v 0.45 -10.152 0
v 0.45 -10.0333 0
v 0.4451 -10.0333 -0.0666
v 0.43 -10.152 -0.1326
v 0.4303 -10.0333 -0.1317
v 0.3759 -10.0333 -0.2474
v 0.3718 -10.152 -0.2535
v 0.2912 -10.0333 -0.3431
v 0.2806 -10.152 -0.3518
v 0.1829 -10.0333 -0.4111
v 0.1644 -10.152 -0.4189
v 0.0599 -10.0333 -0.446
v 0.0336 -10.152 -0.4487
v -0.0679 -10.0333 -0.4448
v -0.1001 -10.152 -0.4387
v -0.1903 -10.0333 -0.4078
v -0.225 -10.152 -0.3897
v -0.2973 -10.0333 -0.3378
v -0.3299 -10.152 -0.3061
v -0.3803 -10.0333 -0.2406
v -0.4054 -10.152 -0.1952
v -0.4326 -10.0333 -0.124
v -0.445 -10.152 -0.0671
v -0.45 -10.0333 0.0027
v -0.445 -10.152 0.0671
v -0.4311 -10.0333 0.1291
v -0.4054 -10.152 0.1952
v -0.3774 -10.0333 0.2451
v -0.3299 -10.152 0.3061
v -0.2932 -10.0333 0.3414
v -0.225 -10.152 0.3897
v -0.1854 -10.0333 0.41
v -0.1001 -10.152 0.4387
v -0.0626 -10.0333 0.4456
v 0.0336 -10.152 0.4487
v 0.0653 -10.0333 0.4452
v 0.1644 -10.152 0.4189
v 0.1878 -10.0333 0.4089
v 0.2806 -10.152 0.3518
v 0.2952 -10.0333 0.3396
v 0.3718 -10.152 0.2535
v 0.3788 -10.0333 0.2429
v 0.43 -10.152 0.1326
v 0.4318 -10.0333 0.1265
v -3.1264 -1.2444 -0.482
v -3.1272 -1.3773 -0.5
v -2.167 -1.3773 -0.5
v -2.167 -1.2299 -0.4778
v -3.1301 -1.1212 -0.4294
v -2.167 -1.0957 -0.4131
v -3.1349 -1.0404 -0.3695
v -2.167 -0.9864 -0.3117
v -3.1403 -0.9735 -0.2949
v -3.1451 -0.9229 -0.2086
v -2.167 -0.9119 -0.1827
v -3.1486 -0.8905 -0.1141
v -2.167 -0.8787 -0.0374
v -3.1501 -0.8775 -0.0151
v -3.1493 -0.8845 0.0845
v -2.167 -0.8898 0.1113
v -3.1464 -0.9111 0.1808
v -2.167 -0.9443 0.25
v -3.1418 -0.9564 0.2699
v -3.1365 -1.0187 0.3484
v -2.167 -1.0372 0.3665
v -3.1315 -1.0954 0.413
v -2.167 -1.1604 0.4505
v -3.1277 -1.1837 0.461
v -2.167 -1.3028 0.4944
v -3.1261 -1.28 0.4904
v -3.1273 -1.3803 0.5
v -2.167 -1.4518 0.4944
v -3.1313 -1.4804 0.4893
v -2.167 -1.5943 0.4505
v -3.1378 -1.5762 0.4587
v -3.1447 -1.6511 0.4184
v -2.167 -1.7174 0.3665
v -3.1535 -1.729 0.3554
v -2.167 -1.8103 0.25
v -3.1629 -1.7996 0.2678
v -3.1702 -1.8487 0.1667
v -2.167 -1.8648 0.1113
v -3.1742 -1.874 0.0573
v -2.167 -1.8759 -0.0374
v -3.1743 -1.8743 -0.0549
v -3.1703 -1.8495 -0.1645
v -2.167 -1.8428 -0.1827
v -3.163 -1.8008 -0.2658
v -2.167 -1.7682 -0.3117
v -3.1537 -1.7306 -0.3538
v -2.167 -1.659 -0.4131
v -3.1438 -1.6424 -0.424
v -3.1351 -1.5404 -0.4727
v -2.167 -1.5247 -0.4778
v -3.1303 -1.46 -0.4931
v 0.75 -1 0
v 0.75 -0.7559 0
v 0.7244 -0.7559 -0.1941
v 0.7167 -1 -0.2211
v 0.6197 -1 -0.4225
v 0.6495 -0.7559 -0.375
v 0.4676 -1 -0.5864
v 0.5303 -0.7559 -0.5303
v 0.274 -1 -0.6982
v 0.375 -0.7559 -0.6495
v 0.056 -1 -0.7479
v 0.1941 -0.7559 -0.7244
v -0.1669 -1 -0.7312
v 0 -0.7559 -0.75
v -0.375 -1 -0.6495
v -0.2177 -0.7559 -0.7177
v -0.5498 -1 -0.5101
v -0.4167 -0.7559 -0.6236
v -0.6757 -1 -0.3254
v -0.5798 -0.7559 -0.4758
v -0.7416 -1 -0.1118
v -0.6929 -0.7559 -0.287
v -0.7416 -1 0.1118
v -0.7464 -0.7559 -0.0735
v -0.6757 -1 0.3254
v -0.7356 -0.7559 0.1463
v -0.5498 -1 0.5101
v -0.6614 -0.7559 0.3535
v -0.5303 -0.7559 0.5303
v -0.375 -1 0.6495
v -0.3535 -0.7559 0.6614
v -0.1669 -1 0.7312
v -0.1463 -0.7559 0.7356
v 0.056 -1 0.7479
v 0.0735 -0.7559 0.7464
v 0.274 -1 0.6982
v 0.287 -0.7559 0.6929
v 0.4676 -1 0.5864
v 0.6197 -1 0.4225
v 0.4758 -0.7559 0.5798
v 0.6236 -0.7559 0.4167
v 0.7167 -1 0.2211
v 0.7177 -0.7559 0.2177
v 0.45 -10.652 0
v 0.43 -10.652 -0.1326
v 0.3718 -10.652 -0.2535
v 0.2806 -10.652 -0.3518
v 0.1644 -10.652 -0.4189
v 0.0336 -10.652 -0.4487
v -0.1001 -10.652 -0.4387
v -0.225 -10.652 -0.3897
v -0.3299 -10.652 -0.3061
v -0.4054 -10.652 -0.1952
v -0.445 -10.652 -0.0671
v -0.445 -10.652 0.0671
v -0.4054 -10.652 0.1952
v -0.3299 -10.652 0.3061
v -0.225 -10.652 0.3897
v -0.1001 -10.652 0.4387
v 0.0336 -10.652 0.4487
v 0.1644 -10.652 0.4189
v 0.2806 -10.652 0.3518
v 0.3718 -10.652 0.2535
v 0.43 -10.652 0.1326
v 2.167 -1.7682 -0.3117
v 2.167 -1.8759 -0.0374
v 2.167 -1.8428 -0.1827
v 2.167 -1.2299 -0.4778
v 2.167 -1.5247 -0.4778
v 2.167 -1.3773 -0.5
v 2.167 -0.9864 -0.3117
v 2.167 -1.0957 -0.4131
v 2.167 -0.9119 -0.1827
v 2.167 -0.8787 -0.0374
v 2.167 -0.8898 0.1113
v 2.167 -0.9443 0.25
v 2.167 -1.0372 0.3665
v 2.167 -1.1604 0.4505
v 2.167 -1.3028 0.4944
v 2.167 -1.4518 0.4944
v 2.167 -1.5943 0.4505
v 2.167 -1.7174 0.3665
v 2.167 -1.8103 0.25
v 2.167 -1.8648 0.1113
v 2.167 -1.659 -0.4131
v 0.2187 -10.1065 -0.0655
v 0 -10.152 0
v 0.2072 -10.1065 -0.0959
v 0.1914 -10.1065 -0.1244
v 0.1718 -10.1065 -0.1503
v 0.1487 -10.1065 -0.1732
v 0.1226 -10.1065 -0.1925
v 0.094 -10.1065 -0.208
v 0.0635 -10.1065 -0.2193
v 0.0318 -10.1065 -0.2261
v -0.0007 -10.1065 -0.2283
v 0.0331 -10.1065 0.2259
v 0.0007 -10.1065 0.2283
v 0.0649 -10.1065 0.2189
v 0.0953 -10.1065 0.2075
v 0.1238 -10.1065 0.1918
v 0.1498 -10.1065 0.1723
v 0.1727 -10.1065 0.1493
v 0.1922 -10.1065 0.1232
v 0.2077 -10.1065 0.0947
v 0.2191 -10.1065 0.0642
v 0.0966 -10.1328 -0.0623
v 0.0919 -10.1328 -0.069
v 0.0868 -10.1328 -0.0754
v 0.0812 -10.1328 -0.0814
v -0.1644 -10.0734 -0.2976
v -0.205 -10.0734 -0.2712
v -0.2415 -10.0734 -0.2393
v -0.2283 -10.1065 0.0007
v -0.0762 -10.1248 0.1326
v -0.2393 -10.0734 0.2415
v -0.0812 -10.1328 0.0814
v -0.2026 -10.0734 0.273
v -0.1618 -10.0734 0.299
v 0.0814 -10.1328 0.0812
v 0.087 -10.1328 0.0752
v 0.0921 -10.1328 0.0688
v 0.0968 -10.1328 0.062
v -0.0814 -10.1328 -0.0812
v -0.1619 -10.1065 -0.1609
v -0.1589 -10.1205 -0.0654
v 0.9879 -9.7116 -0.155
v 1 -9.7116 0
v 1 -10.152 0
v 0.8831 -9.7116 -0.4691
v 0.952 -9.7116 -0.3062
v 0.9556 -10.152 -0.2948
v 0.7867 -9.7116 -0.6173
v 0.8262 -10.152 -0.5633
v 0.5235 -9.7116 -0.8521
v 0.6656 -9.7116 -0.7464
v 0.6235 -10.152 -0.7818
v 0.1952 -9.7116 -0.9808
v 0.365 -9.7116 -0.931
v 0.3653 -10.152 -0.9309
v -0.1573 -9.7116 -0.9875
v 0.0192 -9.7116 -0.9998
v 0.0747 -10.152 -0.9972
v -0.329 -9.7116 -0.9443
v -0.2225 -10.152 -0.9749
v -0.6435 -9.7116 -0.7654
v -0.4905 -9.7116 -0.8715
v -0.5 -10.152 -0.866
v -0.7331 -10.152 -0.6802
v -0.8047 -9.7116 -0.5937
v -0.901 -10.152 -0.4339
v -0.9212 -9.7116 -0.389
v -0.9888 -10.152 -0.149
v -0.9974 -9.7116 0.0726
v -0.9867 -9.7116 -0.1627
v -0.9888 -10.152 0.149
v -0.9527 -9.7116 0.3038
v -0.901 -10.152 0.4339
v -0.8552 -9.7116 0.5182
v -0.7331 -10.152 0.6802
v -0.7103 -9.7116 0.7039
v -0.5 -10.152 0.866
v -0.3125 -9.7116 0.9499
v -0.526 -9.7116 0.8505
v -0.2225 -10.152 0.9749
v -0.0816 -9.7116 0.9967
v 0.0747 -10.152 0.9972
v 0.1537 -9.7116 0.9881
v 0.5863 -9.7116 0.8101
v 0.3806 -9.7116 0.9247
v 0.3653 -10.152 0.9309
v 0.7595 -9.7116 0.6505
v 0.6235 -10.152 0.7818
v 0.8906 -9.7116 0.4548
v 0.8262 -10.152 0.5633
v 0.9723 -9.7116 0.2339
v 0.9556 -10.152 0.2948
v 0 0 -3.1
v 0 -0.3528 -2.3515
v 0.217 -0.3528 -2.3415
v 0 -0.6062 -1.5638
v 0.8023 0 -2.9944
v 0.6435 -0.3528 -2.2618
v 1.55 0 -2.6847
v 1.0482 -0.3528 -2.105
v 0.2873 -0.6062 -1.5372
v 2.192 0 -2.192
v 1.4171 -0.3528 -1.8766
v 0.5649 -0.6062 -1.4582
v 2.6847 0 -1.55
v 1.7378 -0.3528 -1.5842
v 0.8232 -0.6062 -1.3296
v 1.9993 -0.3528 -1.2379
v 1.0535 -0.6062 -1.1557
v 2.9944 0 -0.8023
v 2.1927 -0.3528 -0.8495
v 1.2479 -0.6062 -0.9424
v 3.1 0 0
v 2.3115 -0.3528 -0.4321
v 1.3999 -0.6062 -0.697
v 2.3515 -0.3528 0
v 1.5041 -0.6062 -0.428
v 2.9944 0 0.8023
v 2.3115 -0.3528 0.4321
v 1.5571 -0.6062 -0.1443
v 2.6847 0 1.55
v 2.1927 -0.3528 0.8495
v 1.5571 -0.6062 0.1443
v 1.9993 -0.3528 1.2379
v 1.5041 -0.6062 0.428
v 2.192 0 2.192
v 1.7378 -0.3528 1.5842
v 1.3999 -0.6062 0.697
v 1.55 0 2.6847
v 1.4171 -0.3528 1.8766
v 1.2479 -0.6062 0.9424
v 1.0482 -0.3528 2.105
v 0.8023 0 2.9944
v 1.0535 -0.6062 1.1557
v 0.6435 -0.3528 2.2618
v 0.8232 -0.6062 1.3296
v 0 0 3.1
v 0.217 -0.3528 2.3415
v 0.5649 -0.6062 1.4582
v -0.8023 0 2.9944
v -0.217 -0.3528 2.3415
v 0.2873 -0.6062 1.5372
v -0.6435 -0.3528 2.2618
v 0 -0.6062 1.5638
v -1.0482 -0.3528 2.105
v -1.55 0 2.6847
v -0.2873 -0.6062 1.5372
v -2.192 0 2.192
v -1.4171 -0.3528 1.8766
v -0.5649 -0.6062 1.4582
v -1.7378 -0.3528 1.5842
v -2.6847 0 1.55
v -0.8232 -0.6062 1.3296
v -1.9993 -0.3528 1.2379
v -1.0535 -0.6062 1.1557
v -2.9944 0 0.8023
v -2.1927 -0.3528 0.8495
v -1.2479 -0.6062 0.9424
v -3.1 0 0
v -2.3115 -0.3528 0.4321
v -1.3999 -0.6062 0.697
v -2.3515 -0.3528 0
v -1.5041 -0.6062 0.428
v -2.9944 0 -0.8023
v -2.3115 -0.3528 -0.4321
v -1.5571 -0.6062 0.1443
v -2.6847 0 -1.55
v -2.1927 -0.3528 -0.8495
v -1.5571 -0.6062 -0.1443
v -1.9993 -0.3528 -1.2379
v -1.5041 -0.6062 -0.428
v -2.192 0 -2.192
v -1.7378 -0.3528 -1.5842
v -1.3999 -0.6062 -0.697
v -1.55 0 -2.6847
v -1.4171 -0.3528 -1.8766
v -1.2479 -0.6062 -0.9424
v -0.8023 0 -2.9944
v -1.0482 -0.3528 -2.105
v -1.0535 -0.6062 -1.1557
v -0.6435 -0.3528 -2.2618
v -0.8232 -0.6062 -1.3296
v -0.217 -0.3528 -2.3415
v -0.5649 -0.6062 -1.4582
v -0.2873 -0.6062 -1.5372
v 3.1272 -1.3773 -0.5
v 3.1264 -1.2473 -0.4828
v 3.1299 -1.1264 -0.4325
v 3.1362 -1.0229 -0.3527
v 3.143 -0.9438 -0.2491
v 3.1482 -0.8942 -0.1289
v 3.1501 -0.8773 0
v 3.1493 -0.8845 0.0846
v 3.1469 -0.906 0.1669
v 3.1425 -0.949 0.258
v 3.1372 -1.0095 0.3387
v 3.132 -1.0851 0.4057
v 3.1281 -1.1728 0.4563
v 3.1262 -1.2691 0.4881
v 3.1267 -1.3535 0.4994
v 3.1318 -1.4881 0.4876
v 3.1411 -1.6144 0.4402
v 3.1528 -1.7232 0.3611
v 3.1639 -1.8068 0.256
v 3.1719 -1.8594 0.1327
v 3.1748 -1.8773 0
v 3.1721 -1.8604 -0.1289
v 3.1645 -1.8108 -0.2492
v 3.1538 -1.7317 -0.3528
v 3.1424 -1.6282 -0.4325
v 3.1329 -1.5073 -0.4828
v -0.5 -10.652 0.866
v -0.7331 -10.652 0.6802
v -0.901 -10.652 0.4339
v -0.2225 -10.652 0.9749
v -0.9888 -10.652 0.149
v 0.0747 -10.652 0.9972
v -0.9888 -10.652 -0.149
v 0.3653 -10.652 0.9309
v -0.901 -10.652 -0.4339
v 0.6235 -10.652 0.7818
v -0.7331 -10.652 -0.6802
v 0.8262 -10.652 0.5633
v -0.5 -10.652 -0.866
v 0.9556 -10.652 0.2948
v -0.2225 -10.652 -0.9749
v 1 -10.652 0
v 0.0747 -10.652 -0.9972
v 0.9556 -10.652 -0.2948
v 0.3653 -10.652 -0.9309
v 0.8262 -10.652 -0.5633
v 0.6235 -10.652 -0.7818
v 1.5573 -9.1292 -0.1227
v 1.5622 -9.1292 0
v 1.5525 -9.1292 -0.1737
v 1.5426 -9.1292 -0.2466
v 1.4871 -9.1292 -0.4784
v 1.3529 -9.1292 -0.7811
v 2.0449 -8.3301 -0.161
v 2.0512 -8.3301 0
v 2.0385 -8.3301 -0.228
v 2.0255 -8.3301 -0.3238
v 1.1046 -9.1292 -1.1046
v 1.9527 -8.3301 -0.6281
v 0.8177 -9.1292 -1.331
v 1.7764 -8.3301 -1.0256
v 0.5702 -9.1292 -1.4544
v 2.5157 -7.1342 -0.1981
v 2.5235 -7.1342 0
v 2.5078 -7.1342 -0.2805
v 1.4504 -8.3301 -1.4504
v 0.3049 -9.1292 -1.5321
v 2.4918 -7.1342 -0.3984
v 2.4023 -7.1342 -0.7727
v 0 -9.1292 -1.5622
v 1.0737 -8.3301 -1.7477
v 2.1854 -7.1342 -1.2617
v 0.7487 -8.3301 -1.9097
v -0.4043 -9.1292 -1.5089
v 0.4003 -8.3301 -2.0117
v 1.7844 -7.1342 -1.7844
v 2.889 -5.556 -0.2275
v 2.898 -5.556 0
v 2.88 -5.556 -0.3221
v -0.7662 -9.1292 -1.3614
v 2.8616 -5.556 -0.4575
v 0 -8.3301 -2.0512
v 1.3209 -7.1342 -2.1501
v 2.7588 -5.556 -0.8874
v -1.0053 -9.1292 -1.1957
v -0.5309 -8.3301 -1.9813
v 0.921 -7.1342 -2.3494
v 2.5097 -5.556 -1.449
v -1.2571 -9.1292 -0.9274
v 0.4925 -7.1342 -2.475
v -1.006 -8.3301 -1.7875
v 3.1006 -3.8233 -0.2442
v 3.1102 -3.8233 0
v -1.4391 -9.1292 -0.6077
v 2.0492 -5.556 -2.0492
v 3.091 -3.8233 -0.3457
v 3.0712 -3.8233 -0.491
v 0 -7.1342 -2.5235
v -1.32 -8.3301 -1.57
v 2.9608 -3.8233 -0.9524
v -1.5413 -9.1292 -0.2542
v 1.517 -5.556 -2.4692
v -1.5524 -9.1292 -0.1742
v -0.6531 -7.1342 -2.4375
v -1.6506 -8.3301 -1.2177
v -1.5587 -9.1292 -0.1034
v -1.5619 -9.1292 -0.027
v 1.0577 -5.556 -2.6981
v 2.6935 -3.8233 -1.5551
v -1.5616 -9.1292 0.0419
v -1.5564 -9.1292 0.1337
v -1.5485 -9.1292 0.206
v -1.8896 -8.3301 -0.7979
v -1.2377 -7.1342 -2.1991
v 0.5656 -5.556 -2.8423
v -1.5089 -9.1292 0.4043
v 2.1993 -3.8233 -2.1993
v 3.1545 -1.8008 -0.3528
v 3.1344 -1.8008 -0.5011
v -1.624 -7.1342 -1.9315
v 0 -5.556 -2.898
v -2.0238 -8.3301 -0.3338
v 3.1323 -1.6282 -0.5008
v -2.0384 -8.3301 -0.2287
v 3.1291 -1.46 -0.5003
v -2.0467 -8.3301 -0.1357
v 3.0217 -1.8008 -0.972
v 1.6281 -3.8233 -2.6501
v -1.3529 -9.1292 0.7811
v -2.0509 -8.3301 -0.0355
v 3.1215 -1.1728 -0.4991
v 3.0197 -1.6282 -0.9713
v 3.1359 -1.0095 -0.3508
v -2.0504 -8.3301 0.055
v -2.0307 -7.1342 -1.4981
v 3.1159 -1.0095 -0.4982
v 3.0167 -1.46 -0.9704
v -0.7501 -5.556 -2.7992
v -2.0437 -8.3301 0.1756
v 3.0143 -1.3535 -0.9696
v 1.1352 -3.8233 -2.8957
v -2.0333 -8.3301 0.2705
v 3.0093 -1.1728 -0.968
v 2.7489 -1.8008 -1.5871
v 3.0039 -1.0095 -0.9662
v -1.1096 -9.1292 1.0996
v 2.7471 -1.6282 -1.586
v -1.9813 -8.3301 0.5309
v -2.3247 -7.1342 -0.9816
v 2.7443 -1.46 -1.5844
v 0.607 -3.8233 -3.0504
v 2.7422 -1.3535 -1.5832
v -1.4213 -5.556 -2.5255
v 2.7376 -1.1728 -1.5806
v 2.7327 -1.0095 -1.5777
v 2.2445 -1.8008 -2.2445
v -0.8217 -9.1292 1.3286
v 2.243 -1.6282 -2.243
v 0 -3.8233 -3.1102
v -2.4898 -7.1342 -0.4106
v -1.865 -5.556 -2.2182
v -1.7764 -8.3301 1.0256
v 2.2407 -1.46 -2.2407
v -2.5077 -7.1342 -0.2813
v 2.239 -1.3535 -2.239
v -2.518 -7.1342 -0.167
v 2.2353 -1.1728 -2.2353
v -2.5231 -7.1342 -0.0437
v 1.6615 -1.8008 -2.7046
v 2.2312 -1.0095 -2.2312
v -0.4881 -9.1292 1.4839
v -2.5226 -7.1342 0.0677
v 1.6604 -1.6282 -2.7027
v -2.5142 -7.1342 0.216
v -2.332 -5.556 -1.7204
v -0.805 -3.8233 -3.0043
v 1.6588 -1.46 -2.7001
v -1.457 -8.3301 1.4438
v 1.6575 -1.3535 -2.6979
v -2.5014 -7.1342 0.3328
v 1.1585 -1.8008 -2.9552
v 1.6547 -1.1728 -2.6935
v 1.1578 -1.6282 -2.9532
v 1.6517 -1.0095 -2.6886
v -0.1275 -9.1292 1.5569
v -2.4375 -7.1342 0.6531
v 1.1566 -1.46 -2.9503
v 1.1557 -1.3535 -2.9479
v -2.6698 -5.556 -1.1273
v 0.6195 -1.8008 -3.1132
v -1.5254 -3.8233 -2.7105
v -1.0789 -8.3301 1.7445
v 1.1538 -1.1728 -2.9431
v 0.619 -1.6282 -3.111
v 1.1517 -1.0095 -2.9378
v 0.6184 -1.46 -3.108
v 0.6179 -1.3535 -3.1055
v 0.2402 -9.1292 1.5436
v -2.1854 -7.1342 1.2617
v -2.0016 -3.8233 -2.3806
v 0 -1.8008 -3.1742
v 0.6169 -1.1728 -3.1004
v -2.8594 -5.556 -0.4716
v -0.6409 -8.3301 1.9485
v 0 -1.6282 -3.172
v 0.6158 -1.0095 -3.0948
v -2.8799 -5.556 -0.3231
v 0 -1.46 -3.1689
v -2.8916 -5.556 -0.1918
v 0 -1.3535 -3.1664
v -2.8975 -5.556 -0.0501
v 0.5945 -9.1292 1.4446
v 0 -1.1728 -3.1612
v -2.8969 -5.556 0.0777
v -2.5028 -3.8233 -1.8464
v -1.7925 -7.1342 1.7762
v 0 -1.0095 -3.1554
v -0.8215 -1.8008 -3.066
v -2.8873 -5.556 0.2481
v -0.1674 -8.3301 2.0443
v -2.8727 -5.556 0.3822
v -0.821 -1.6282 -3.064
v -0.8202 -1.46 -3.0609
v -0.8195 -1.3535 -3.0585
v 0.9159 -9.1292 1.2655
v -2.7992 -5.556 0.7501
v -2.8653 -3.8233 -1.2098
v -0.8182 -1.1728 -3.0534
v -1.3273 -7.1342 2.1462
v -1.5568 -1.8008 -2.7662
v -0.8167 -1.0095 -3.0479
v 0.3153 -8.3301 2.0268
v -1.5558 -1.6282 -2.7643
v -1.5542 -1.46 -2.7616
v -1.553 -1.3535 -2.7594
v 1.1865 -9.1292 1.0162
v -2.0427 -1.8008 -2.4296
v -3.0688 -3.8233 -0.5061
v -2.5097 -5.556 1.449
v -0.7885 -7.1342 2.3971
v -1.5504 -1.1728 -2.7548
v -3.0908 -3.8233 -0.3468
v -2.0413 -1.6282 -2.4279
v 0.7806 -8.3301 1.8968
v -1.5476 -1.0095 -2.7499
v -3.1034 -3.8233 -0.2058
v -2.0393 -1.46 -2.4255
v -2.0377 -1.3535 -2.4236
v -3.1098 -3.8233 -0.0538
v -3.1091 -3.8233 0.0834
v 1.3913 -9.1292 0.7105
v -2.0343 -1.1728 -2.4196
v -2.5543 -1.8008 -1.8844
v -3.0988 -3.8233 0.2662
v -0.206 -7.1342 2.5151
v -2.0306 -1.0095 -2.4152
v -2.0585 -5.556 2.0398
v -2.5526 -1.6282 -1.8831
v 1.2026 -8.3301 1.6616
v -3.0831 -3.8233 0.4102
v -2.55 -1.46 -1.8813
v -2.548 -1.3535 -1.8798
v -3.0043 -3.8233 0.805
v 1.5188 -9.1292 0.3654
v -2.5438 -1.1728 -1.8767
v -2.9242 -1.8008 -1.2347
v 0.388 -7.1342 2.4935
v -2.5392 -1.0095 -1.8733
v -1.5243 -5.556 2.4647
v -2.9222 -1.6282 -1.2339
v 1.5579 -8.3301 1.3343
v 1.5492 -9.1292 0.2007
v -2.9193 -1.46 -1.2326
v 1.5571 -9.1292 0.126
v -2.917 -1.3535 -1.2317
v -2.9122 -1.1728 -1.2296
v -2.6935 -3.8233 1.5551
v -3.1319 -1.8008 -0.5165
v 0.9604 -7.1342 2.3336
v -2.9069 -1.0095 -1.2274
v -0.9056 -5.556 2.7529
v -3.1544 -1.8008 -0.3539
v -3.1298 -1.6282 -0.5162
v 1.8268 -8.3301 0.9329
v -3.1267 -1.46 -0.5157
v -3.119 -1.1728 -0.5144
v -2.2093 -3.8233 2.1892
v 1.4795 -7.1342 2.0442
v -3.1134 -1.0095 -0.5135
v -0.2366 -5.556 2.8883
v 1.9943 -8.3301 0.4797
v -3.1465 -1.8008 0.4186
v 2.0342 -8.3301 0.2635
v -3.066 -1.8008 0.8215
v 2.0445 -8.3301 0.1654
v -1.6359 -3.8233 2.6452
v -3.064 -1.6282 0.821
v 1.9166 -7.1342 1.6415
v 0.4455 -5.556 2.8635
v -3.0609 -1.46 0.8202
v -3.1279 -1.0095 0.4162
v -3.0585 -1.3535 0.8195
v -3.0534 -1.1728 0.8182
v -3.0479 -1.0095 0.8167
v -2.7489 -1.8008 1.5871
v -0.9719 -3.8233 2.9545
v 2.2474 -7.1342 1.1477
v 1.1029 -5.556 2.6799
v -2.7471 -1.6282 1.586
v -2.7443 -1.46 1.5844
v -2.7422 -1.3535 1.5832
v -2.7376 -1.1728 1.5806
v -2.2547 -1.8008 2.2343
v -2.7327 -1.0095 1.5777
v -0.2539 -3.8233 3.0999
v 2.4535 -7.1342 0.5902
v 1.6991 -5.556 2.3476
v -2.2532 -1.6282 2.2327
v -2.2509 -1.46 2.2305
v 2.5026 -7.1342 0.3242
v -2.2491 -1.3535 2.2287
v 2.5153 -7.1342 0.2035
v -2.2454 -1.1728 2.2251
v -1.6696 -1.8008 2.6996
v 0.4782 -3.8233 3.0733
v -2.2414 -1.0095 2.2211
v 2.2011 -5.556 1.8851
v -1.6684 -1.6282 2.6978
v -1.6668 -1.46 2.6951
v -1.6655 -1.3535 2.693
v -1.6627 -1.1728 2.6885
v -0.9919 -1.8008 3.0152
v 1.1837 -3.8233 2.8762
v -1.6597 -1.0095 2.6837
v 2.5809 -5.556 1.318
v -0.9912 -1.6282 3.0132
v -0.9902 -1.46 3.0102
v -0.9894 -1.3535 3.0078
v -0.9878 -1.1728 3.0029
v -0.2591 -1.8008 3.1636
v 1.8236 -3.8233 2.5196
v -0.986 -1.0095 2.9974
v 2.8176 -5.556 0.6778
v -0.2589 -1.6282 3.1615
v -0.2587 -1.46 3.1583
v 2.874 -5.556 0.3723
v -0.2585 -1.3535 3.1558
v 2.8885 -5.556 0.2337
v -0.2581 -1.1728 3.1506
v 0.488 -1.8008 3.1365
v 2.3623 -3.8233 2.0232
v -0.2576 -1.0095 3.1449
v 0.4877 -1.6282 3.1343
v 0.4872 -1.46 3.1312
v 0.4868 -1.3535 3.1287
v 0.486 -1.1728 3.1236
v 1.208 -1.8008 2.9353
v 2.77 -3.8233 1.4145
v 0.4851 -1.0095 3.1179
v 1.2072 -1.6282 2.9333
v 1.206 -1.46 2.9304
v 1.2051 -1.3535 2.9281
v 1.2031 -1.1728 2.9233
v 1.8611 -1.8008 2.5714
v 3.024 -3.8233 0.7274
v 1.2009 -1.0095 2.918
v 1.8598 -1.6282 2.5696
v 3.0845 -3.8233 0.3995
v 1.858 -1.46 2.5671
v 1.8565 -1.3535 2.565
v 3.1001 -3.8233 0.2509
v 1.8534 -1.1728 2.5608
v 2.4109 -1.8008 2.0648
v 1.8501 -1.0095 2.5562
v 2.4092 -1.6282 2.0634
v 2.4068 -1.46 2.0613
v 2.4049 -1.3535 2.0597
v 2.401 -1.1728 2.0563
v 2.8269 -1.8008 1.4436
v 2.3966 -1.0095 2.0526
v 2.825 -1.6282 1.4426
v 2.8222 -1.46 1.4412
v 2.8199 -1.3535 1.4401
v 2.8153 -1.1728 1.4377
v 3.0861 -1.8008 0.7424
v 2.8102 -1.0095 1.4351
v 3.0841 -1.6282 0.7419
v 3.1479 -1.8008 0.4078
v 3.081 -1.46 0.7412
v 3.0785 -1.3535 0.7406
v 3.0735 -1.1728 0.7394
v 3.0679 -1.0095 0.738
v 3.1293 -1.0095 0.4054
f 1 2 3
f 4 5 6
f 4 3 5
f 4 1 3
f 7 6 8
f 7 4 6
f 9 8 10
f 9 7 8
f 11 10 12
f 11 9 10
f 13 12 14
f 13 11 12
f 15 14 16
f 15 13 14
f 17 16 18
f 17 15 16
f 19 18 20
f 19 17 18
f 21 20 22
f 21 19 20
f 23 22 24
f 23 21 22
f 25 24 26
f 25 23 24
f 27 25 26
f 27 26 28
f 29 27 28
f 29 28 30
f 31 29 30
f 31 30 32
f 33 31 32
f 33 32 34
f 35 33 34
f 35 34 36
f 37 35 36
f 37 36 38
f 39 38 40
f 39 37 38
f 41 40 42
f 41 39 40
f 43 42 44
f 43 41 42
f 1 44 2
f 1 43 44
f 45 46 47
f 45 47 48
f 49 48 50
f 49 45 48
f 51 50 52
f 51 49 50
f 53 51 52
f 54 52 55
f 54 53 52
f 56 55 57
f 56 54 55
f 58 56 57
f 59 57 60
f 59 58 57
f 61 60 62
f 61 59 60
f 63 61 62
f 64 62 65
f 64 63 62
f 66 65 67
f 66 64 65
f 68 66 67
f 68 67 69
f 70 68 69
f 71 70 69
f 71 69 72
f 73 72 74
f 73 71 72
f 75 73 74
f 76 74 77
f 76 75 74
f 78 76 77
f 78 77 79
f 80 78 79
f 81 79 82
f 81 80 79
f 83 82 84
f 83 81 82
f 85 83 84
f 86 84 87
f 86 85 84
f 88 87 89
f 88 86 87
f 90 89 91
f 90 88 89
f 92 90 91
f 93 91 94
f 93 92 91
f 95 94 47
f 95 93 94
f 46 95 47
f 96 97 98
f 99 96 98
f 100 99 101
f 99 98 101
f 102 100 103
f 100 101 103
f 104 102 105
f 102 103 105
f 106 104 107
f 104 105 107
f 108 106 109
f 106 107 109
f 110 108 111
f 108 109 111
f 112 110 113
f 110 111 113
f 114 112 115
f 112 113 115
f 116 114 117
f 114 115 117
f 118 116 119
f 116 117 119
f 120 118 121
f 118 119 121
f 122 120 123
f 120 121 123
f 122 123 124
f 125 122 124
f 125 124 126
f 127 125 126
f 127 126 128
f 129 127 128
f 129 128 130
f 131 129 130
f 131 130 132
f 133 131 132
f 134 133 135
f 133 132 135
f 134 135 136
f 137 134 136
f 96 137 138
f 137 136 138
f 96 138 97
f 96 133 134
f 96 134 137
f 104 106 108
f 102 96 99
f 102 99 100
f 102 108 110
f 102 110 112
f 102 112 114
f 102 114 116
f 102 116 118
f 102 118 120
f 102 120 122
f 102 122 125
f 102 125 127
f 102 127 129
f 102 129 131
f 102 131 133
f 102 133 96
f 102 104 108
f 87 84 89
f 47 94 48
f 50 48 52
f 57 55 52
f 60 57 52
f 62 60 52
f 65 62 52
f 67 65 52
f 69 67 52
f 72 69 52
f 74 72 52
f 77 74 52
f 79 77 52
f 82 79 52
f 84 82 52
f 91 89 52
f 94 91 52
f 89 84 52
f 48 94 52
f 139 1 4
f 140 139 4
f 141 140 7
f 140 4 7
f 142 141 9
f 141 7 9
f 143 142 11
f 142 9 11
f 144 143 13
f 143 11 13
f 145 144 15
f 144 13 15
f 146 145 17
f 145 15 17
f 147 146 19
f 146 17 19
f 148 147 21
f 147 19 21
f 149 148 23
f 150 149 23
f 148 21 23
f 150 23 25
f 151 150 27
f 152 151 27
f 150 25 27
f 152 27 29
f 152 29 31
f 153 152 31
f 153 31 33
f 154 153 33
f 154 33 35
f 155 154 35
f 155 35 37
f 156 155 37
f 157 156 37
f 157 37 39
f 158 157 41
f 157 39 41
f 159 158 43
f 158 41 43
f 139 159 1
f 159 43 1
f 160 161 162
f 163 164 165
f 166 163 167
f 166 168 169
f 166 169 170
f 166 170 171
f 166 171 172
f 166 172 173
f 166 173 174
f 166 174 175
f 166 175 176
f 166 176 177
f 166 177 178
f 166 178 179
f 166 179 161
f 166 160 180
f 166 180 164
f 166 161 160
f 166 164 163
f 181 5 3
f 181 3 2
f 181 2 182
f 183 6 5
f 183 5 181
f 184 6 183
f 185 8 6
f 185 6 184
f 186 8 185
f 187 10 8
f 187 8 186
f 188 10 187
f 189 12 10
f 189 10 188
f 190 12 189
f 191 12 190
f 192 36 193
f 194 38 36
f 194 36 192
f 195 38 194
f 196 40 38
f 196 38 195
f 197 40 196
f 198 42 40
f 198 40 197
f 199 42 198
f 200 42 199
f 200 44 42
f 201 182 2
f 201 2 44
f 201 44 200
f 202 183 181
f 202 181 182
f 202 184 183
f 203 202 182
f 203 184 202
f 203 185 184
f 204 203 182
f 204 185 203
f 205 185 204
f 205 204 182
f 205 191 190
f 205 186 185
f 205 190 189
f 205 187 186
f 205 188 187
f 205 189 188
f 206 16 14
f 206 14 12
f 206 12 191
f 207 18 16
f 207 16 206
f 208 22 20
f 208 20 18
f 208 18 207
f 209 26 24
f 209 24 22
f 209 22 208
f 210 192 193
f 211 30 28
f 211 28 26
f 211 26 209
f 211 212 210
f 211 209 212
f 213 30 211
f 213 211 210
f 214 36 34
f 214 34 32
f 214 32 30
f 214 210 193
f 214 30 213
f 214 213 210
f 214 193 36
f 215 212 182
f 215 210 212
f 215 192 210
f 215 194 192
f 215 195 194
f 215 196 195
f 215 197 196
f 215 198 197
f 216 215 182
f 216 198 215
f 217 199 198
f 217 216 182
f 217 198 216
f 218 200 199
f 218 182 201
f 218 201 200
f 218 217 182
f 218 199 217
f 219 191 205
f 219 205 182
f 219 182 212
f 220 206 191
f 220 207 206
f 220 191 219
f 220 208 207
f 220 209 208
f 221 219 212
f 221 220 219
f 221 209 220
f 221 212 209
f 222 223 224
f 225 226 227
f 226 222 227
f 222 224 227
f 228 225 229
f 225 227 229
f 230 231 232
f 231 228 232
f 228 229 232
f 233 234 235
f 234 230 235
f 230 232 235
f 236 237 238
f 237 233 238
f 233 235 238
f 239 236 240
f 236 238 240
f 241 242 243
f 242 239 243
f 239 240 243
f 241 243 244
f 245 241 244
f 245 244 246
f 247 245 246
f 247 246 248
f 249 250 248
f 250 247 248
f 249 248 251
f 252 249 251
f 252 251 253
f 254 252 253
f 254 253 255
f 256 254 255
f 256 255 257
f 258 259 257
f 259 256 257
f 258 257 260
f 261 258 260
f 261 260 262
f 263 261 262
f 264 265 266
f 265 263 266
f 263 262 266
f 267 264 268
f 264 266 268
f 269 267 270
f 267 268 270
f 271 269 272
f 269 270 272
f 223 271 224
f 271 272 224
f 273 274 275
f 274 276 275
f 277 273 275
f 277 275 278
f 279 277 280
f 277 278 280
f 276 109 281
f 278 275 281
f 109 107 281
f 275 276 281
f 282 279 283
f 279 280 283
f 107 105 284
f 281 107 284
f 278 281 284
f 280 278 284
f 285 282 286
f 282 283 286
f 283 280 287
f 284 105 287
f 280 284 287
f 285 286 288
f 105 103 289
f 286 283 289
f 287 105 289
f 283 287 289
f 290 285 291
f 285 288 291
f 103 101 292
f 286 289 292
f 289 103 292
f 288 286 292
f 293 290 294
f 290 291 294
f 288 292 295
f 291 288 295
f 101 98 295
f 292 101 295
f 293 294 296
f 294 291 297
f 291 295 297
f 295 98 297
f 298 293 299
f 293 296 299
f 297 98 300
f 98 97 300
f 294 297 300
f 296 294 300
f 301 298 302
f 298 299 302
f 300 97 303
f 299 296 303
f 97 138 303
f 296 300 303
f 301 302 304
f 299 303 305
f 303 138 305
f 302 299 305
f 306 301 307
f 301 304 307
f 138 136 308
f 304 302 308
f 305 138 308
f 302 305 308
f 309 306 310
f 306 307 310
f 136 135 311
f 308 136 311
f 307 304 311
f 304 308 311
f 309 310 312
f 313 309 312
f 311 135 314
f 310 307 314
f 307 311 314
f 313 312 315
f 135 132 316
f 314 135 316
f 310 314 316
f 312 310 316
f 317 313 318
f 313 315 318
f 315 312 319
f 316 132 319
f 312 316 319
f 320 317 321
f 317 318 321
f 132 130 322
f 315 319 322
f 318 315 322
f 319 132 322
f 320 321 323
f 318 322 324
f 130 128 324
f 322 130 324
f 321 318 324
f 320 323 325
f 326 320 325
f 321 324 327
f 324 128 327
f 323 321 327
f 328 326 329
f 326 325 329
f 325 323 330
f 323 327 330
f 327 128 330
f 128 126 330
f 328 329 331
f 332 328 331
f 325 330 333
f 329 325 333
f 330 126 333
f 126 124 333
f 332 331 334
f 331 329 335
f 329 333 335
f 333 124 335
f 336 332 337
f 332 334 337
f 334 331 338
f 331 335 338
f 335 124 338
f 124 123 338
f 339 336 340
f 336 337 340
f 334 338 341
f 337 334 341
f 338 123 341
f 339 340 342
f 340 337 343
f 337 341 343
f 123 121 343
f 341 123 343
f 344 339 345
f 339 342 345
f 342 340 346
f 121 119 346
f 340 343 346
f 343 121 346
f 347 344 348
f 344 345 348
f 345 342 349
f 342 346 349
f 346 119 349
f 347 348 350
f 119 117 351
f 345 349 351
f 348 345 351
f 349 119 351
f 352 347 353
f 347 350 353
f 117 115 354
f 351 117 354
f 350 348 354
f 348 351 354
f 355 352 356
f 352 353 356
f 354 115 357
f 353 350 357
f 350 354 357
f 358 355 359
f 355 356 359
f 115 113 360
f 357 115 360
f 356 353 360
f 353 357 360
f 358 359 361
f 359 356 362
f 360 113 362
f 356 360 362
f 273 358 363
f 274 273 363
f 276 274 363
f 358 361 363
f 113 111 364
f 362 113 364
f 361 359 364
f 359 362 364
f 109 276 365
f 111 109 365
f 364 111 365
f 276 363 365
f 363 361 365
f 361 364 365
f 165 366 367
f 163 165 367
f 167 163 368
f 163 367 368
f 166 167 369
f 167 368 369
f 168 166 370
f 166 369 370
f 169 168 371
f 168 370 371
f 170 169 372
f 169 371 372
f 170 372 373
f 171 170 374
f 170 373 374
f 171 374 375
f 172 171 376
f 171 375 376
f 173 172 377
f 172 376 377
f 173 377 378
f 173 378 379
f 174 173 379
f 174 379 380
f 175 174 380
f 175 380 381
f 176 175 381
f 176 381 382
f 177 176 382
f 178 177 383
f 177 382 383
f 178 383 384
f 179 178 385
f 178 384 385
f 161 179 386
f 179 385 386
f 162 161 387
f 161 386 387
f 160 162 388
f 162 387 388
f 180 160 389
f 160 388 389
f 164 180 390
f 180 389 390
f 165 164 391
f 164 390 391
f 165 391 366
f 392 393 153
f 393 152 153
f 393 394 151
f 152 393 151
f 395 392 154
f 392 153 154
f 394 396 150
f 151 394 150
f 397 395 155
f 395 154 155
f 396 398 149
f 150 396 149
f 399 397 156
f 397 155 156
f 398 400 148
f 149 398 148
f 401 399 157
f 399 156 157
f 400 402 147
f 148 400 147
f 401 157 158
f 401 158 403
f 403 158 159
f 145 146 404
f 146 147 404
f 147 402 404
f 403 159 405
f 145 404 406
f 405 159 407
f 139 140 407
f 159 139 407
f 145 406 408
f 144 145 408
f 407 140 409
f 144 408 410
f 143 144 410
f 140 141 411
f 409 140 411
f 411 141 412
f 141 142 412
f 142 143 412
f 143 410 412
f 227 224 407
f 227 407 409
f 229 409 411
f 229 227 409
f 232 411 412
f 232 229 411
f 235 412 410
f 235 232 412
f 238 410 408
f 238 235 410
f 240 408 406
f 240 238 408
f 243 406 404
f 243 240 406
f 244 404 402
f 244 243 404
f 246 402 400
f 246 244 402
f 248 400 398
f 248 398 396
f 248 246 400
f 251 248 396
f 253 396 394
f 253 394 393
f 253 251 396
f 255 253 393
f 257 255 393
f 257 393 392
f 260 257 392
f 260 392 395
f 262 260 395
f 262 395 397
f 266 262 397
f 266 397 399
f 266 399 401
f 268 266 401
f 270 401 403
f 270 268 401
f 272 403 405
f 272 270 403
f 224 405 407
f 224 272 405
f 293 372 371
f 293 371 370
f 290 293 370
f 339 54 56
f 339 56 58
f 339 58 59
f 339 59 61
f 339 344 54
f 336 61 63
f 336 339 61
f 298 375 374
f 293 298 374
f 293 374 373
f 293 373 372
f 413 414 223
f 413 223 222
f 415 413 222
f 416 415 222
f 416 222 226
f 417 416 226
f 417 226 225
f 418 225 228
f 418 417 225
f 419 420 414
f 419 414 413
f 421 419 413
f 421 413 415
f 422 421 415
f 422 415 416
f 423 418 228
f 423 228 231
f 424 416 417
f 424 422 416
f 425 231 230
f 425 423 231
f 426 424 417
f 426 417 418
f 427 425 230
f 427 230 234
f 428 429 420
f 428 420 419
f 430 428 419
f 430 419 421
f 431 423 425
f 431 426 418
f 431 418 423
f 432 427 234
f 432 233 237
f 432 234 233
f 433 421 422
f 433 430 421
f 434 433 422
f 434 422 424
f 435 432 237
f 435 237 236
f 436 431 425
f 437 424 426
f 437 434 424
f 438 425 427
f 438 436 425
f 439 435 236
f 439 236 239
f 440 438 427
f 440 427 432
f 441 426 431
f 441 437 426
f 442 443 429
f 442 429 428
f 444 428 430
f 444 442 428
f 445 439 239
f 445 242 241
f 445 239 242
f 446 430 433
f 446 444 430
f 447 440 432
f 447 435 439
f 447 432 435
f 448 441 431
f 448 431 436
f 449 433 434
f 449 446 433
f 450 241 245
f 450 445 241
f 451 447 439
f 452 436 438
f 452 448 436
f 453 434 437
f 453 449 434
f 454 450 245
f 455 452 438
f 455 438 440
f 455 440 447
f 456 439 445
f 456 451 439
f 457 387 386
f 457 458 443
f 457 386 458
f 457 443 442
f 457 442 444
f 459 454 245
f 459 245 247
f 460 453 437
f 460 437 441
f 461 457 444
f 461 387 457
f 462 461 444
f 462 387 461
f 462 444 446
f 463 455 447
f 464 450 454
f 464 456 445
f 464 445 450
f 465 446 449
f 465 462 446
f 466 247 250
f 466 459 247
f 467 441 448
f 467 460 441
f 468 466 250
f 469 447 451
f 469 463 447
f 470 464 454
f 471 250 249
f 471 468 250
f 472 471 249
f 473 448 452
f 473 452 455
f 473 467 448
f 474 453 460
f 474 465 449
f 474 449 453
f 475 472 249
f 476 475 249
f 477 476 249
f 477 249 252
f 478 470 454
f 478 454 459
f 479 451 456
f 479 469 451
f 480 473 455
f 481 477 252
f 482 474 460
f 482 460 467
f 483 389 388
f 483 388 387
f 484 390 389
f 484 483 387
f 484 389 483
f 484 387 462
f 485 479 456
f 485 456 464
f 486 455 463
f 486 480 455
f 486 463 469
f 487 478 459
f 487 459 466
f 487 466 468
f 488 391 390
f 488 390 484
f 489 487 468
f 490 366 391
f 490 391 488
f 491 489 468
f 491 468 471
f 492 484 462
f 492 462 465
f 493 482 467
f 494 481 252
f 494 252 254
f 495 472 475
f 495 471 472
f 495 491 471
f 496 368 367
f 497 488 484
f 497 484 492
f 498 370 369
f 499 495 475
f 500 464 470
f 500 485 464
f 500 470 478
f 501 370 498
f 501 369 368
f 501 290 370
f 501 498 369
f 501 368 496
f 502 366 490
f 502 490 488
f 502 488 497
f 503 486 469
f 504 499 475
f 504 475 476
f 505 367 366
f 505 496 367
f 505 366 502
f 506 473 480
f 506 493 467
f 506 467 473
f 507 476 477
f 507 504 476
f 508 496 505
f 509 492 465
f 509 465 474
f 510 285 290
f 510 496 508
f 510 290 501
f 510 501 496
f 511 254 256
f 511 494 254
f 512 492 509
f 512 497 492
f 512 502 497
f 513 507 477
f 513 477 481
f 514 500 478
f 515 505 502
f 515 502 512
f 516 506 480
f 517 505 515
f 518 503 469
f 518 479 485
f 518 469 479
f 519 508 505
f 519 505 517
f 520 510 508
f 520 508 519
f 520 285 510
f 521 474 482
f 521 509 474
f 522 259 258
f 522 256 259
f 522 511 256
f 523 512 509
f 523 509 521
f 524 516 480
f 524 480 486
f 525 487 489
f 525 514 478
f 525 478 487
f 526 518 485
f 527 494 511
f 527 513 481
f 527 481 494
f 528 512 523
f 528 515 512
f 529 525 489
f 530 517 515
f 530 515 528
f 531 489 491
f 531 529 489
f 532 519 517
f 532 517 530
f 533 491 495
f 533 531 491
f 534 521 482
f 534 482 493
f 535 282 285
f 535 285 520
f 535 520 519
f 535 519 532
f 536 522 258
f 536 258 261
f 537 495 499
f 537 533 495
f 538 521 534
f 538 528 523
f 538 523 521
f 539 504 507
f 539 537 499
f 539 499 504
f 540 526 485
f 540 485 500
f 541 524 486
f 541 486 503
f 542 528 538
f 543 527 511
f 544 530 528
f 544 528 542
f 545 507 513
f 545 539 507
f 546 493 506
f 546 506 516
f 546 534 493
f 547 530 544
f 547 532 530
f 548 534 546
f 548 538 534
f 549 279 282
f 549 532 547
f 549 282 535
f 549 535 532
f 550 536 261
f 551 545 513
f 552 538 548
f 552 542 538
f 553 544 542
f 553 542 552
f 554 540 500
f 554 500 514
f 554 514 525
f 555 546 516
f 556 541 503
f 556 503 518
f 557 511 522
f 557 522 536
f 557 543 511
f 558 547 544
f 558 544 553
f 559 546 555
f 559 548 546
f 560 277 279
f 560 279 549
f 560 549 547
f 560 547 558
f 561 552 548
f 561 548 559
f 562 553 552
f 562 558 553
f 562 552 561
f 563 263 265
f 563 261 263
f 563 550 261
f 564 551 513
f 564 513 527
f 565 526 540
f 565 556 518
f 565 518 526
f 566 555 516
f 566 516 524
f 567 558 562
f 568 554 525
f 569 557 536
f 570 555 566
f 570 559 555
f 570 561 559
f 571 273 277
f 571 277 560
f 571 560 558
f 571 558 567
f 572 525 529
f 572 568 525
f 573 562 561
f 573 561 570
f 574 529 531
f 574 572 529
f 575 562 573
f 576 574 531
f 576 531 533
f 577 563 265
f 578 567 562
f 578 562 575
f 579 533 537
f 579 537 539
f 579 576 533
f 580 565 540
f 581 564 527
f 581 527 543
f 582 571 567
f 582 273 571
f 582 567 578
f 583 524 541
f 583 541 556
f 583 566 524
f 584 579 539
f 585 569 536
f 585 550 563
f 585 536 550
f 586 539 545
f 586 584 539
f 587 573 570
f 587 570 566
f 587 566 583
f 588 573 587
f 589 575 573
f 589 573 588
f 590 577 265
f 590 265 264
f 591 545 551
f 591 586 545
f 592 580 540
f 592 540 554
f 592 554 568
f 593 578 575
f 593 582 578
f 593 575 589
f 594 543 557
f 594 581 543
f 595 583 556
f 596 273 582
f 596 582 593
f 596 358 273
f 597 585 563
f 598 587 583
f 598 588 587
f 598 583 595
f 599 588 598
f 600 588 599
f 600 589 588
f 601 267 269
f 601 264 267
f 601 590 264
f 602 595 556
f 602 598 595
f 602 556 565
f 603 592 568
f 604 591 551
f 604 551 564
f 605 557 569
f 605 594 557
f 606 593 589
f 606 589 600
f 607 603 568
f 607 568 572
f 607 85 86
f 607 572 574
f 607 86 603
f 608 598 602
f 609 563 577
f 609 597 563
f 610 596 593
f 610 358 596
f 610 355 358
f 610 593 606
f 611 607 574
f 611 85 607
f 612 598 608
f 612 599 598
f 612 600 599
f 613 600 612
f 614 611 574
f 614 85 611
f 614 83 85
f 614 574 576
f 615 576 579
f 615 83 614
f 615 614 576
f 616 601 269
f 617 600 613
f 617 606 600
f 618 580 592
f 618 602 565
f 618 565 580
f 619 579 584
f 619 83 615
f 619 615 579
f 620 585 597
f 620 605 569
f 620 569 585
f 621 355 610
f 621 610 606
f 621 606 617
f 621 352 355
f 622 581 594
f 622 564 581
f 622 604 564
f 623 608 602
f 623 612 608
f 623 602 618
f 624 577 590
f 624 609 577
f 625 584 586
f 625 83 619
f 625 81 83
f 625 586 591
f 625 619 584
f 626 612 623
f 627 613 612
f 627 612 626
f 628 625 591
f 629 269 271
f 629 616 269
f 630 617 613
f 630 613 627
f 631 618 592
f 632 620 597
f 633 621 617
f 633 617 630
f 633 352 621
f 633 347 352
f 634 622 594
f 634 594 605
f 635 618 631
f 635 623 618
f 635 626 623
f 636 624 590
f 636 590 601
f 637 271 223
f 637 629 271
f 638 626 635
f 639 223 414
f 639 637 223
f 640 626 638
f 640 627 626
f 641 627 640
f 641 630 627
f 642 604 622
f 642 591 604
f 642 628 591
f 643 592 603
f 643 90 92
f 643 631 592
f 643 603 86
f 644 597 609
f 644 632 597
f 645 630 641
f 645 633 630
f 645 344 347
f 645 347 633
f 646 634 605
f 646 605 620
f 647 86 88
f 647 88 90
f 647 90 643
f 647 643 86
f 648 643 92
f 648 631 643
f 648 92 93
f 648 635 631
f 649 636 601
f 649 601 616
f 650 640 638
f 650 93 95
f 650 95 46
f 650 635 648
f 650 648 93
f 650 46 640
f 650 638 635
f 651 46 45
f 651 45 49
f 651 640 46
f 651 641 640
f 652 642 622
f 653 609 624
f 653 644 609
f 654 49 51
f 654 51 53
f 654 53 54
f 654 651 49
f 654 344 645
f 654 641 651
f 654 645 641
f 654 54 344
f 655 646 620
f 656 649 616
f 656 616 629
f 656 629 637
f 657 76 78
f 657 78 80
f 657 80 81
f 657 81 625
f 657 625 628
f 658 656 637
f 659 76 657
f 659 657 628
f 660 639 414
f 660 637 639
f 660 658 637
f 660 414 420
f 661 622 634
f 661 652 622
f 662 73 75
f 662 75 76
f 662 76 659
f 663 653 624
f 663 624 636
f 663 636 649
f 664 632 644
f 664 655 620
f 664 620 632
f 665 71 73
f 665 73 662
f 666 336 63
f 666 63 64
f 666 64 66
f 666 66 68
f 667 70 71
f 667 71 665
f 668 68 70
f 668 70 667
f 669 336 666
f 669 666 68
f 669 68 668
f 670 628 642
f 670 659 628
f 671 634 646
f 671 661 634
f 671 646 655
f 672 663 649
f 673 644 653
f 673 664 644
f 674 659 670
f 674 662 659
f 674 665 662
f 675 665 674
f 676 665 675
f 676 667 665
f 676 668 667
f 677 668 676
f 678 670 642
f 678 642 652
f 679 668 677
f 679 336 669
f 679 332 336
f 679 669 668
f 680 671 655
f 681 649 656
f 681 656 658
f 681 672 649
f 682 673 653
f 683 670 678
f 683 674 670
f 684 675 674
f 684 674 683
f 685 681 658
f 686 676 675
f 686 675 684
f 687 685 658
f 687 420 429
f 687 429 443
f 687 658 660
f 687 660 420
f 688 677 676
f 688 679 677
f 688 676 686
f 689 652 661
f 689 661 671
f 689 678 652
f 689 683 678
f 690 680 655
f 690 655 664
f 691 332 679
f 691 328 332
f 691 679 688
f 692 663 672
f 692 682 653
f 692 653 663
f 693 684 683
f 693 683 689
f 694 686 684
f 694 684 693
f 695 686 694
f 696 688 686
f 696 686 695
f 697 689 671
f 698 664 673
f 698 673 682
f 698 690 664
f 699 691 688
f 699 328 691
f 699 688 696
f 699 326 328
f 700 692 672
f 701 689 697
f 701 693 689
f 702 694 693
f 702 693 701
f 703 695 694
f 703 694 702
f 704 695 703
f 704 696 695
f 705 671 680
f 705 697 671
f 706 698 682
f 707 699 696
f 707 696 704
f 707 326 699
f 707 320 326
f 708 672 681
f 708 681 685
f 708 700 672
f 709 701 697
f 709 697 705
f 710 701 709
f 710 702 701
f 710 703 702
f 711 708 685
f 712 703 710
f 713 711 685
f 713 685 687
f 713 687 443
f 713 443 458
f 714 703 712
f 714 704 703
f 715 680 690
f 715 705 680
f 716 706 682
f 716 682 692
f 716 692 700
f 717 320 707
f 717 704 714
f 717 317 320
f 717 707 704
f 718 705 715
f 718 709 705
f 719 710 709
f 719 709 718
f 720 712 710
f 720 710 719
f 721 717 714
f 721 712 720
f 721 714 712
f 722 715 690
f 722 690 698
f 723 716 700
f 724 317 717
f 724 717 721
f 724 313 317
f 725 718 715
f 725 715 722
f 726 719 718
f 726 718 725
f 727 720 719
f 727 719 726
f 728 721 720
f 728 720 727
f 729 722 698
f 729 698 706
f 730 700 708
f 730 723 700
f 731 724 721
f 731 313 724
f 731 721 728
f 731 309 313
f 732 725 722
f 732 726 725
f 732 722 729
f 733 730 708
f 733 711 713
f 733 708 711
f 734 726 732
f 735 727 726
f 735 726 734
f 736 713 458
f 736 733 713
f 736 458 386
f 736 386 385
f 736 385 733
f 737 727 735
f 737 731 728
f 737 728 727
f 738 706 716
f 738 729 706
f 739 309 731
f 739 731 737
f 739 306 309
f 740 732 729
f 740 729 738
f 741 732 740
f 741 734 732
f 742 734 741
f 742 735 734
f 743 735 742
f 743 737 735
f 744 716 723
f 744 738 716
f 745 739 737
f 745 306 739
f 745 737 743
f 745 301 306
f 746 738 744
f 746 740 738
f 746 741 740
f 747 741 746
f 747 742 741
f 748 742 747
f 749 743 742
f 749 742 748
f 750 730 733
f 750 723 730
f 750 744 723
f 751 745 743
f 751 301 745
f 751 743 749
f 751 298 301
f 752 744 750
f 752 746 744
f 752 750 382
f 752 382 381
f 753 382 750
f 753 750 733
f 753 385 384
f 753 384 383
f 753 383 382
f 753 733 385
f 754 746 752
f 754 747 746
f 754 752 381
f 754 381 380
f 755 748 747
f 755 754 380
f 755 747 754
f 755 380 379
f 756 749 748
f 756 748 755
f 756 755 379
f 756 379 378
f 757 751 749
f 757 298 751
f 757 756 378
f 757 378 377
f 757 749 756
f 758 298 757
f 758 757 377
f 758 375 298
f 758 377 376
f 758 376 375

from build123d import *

# Parameters (mm, degrees)
DOME2_FACE_RADIUS               = 3.1
DOME2_HEIGHT                    = 0.8
SKETCH6_R                       = 0.500000006
CUT_EXTRUDE2_DEPTH              = 1
SKETCH7_R                       = 0.75
CUT_EXTRUDE3_DEPTH              = 1
BOSS_EXTRUDE1_REACH             = 12.152
SKETCH9_R                       = 1
SKETCH9_R_2                     = 0.45
BOSS_EXTRUDE1_DIRECTION_2_DEPTH = 0.5


with BuildPart() as part:
    # Sketch2 → Revolve2 (revolve)
    with BuildSketch(Plane.XY):
        with BuildLine():
            Line((0, 0), (3.1, 0))
            add(Edge.make_bspline(
                [(0, -10.151978408), (2.177642547, -9.857333884), (3.515065362, -5.793498011), (3.1, 0)],
                knots=[0, 0, 0, 0, 1, 1, 1, 1], degree=3))
            Line((0, -10.151978408), (0, 0))
        make_face()
    revolve(axis=Axis((0, -10.151978408, 0), (0, 1, 0)))

    # Dome2: a dome of height H over a round flat face of radius A is a cap of a sphere of radius (A * A + H * H) / (2 * H)
    dome2_r = (DOME2_FACE_RADIUS * DOME2_FACE_RADIUS + DOME2_HEIGHT * DOME2_HEIGHT) / (2 * DOME2_HEIGHT)
    dome2_base = Plane((0, 0, 0), z_dir=(0, -1, 0))
    with Locations(dome2_base.offset(DOME2_HEIGHT - dome2_r)):
        dome2_ball = Sphere(dome2_r, mode=Mode.PRIVATE)
    add(split(dome2_ball, bisect_by=dome2_base, keep=Keep.TOP, mode=Mode.PRIVATE), mode=Mode.SUBTRACT)

    # Sketch6 → Cut-Extrude2 (cut, symmetric)
    with BuildSketch(Plane(origin=(3.16696636, 0, 0), x_dir=(0, 0, -1), z_dir=(1, 0, 0))):
        with Locations((0, -1.377313707)):
            Circle(SKETCH6_R)
    cut_extrude2 = extrude(amount=CUT_EXTRUDE2_DEPTH, both=True, mode=Mode.SUBTRACT)

    # Mirror1: Cut-Extrude2 across plane
    add(cut_extrude2.mirror(Plane(origin=(0, 0, 0), x_dir=(0, 0, 1), z_dir=(1, 0, 0))), mode=Mode.SUBTRACT)

    # Sketch7 → Cut-Extrude3 (cut)
    with BuildSketch(Plane(origin=(0, 0, 0), x_dir=(1, 0, 0), z_dir=(0, 1, 0))):
        Circle(SKETCH7_R)
    extrude(amount=-CUT_EXTRUDE3_DEPTH, mode=Mode.SUBTRACT)

    # Sketch9 → Boss-Extrude1 (add, up to next)
    with BuildSketch(Plane(origin=(0, -10.151978408, 0), x_dir=(1, 0, 0), z_dir=(0, 1, 0)), mode=Mode.PRIVATE) as boss_extrude1_sk1:
        Circle(SKETCH9_R)
        Circle(SKETCH9_R_2, mode=Mode.SUBTRACT)
    boss_extrude1_tool1 = extrude(boss_extrude1_sk1.sketch, amount=BOSS_EXTRUDE1_REACH, mode=Mode.PRIVATE) - part.part
    add(boss_extrude1_tool1.solids().sort_by_distance((-0.971716, -10.151978, 0))[0])

    # Sketch9 → Boss-Extrude1 direction 2 (add)
    with BuildSketch(Plane(origin=(0, -10.151978408, 0), x_dir=(1, 0, 0), z_dir=(0, 1, 0))):
        Circle(SKETCH9_R)
        Circle(SKETCH9_R_2, mode=Mode.SUBTRACT)
    extrude(amount=-BOSS_EXTRUDE1_DIRECTION_2_DEPTH)


solid = part.part
